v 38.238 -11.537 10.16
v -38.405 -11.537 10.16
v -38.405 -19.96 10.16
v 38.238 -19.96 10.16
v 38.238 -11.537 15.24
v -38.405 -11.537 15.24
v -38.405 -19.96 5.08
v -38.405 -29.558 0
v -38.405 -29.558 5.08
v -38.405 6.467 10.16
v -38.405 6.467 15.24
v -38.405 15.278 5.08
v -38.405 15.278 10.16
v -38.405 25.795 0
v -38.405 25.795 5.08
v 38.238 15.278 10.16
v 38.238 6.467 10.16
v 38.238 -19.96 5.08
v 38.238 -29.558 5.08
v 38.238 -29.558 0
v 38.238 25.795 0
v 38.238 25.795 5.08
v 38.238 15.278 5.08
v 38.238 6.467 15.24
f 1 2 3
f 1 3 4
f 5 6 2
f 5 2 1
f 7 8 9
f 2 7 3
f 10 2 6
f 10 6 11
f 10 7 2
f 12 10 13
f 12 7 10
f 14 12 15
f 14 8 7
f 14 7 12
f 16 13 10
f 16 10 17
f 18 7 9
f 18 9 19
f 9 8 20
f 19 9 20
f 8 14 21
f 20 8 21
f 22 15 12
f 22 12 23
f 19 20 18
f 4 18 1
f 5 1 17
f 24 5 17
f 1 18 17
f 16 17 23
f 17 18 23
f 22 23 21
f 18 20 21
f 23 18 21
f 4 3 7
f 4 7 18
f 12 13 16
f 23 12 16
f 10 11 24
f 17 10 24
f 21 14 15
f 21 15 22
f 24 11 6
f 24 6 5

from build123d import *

# Parameters (mm, degrees)
F0_W     = 76.6426213086
F0_H     = 55.3530044854
F1_DEPTH = 25.4
F2_W     = 76.6426213086
F2_H     = 9.5973666757
F3_DEPTH = 20.32
F2_H_2   = 8.4236329421
F4_DEPTH = 15.24
F2_H_3   = 9.6555026248
F5_DEPTH = 10.16
F2_H_4   = 8.3485189825
F6_DEPTH = 10.16
F2_H_5   = 8.8109364733
F7_DEPTH = 15.24
F2_H_6   = 10.5170467868
F8_DEPTH = 20.32


with BuildPart() as f1:
    # F0 (on Top) → F1 (new body)
    with BuildSketch(Plane.XY):
        with Locations((-0.0834930688, -1.8811021)):
            Rectangle(F0_W, F0_H)
    extrude(amount=F1_DEPTH)

    # F2 (on face) → F3 (cut)
    with BuildSketch(Plane.XY.offset(25.4)):
        with Locations((-0.0834930688, -24.7589210048)):
            Rectangle(F2_W, F2_H)
    extrude(amount=-F3_DEPTH, mode=Mode.SUBTRACT)

    # F2 (on face) → F4 (cut)
    with BuildSketch(Plane.XY.offset(25.4)):
        with Locations((-0.0834930688, -15.7484211959)):
            Rectangle(F2_W, F2_H_2)
    extrude(amount=-F4_DEPTH, mode=Mode.SUBTRACT)

    # F2 (on face) → F5 (cut)
    with BuildSketch(Plane.XY.offset(25.4)):
        with Locations((-0.0834930688, -6.7088534124)):
            Rectangle(F2_W, F2_H_3)
    extrude(amount=-F5_DEPTH, mode=Mode.SUBTRACT)

    # F2 (on face) → F6 (cut)
    with BuildSketch(Plane.XY.offset(25.4)):
        with Locations((-0.0834930688, 2.2931573913)):
            Rectangle(F2_W, F2_H_4)
    extrude(amount=-F6_DEPTH, mode=Mode.SUBTRACT)

    # F2 (on face) → F7 (cut)
    with BuildSketch(Plane.XY.offset(25.4)):
        with Locations((-0.0834930688, 10.8728851192)):
            Rectangle(F2_W, F2_H_5)
    extrude(amount=-F7_DEPTH, mode=Mode.SUBTRACT)

    # F2 (on face) → F8 (cut)
    with BuildSketch(Plane.XY.offset(25.4)):
        with Locations((-0.0834930688, 20.5368767492)):
            Rectangle(F2_W, F2_H_6)
    extrude(amount=-F8_DEPTH, mode=Mode.SUBTRACT)


solid = f1.part
